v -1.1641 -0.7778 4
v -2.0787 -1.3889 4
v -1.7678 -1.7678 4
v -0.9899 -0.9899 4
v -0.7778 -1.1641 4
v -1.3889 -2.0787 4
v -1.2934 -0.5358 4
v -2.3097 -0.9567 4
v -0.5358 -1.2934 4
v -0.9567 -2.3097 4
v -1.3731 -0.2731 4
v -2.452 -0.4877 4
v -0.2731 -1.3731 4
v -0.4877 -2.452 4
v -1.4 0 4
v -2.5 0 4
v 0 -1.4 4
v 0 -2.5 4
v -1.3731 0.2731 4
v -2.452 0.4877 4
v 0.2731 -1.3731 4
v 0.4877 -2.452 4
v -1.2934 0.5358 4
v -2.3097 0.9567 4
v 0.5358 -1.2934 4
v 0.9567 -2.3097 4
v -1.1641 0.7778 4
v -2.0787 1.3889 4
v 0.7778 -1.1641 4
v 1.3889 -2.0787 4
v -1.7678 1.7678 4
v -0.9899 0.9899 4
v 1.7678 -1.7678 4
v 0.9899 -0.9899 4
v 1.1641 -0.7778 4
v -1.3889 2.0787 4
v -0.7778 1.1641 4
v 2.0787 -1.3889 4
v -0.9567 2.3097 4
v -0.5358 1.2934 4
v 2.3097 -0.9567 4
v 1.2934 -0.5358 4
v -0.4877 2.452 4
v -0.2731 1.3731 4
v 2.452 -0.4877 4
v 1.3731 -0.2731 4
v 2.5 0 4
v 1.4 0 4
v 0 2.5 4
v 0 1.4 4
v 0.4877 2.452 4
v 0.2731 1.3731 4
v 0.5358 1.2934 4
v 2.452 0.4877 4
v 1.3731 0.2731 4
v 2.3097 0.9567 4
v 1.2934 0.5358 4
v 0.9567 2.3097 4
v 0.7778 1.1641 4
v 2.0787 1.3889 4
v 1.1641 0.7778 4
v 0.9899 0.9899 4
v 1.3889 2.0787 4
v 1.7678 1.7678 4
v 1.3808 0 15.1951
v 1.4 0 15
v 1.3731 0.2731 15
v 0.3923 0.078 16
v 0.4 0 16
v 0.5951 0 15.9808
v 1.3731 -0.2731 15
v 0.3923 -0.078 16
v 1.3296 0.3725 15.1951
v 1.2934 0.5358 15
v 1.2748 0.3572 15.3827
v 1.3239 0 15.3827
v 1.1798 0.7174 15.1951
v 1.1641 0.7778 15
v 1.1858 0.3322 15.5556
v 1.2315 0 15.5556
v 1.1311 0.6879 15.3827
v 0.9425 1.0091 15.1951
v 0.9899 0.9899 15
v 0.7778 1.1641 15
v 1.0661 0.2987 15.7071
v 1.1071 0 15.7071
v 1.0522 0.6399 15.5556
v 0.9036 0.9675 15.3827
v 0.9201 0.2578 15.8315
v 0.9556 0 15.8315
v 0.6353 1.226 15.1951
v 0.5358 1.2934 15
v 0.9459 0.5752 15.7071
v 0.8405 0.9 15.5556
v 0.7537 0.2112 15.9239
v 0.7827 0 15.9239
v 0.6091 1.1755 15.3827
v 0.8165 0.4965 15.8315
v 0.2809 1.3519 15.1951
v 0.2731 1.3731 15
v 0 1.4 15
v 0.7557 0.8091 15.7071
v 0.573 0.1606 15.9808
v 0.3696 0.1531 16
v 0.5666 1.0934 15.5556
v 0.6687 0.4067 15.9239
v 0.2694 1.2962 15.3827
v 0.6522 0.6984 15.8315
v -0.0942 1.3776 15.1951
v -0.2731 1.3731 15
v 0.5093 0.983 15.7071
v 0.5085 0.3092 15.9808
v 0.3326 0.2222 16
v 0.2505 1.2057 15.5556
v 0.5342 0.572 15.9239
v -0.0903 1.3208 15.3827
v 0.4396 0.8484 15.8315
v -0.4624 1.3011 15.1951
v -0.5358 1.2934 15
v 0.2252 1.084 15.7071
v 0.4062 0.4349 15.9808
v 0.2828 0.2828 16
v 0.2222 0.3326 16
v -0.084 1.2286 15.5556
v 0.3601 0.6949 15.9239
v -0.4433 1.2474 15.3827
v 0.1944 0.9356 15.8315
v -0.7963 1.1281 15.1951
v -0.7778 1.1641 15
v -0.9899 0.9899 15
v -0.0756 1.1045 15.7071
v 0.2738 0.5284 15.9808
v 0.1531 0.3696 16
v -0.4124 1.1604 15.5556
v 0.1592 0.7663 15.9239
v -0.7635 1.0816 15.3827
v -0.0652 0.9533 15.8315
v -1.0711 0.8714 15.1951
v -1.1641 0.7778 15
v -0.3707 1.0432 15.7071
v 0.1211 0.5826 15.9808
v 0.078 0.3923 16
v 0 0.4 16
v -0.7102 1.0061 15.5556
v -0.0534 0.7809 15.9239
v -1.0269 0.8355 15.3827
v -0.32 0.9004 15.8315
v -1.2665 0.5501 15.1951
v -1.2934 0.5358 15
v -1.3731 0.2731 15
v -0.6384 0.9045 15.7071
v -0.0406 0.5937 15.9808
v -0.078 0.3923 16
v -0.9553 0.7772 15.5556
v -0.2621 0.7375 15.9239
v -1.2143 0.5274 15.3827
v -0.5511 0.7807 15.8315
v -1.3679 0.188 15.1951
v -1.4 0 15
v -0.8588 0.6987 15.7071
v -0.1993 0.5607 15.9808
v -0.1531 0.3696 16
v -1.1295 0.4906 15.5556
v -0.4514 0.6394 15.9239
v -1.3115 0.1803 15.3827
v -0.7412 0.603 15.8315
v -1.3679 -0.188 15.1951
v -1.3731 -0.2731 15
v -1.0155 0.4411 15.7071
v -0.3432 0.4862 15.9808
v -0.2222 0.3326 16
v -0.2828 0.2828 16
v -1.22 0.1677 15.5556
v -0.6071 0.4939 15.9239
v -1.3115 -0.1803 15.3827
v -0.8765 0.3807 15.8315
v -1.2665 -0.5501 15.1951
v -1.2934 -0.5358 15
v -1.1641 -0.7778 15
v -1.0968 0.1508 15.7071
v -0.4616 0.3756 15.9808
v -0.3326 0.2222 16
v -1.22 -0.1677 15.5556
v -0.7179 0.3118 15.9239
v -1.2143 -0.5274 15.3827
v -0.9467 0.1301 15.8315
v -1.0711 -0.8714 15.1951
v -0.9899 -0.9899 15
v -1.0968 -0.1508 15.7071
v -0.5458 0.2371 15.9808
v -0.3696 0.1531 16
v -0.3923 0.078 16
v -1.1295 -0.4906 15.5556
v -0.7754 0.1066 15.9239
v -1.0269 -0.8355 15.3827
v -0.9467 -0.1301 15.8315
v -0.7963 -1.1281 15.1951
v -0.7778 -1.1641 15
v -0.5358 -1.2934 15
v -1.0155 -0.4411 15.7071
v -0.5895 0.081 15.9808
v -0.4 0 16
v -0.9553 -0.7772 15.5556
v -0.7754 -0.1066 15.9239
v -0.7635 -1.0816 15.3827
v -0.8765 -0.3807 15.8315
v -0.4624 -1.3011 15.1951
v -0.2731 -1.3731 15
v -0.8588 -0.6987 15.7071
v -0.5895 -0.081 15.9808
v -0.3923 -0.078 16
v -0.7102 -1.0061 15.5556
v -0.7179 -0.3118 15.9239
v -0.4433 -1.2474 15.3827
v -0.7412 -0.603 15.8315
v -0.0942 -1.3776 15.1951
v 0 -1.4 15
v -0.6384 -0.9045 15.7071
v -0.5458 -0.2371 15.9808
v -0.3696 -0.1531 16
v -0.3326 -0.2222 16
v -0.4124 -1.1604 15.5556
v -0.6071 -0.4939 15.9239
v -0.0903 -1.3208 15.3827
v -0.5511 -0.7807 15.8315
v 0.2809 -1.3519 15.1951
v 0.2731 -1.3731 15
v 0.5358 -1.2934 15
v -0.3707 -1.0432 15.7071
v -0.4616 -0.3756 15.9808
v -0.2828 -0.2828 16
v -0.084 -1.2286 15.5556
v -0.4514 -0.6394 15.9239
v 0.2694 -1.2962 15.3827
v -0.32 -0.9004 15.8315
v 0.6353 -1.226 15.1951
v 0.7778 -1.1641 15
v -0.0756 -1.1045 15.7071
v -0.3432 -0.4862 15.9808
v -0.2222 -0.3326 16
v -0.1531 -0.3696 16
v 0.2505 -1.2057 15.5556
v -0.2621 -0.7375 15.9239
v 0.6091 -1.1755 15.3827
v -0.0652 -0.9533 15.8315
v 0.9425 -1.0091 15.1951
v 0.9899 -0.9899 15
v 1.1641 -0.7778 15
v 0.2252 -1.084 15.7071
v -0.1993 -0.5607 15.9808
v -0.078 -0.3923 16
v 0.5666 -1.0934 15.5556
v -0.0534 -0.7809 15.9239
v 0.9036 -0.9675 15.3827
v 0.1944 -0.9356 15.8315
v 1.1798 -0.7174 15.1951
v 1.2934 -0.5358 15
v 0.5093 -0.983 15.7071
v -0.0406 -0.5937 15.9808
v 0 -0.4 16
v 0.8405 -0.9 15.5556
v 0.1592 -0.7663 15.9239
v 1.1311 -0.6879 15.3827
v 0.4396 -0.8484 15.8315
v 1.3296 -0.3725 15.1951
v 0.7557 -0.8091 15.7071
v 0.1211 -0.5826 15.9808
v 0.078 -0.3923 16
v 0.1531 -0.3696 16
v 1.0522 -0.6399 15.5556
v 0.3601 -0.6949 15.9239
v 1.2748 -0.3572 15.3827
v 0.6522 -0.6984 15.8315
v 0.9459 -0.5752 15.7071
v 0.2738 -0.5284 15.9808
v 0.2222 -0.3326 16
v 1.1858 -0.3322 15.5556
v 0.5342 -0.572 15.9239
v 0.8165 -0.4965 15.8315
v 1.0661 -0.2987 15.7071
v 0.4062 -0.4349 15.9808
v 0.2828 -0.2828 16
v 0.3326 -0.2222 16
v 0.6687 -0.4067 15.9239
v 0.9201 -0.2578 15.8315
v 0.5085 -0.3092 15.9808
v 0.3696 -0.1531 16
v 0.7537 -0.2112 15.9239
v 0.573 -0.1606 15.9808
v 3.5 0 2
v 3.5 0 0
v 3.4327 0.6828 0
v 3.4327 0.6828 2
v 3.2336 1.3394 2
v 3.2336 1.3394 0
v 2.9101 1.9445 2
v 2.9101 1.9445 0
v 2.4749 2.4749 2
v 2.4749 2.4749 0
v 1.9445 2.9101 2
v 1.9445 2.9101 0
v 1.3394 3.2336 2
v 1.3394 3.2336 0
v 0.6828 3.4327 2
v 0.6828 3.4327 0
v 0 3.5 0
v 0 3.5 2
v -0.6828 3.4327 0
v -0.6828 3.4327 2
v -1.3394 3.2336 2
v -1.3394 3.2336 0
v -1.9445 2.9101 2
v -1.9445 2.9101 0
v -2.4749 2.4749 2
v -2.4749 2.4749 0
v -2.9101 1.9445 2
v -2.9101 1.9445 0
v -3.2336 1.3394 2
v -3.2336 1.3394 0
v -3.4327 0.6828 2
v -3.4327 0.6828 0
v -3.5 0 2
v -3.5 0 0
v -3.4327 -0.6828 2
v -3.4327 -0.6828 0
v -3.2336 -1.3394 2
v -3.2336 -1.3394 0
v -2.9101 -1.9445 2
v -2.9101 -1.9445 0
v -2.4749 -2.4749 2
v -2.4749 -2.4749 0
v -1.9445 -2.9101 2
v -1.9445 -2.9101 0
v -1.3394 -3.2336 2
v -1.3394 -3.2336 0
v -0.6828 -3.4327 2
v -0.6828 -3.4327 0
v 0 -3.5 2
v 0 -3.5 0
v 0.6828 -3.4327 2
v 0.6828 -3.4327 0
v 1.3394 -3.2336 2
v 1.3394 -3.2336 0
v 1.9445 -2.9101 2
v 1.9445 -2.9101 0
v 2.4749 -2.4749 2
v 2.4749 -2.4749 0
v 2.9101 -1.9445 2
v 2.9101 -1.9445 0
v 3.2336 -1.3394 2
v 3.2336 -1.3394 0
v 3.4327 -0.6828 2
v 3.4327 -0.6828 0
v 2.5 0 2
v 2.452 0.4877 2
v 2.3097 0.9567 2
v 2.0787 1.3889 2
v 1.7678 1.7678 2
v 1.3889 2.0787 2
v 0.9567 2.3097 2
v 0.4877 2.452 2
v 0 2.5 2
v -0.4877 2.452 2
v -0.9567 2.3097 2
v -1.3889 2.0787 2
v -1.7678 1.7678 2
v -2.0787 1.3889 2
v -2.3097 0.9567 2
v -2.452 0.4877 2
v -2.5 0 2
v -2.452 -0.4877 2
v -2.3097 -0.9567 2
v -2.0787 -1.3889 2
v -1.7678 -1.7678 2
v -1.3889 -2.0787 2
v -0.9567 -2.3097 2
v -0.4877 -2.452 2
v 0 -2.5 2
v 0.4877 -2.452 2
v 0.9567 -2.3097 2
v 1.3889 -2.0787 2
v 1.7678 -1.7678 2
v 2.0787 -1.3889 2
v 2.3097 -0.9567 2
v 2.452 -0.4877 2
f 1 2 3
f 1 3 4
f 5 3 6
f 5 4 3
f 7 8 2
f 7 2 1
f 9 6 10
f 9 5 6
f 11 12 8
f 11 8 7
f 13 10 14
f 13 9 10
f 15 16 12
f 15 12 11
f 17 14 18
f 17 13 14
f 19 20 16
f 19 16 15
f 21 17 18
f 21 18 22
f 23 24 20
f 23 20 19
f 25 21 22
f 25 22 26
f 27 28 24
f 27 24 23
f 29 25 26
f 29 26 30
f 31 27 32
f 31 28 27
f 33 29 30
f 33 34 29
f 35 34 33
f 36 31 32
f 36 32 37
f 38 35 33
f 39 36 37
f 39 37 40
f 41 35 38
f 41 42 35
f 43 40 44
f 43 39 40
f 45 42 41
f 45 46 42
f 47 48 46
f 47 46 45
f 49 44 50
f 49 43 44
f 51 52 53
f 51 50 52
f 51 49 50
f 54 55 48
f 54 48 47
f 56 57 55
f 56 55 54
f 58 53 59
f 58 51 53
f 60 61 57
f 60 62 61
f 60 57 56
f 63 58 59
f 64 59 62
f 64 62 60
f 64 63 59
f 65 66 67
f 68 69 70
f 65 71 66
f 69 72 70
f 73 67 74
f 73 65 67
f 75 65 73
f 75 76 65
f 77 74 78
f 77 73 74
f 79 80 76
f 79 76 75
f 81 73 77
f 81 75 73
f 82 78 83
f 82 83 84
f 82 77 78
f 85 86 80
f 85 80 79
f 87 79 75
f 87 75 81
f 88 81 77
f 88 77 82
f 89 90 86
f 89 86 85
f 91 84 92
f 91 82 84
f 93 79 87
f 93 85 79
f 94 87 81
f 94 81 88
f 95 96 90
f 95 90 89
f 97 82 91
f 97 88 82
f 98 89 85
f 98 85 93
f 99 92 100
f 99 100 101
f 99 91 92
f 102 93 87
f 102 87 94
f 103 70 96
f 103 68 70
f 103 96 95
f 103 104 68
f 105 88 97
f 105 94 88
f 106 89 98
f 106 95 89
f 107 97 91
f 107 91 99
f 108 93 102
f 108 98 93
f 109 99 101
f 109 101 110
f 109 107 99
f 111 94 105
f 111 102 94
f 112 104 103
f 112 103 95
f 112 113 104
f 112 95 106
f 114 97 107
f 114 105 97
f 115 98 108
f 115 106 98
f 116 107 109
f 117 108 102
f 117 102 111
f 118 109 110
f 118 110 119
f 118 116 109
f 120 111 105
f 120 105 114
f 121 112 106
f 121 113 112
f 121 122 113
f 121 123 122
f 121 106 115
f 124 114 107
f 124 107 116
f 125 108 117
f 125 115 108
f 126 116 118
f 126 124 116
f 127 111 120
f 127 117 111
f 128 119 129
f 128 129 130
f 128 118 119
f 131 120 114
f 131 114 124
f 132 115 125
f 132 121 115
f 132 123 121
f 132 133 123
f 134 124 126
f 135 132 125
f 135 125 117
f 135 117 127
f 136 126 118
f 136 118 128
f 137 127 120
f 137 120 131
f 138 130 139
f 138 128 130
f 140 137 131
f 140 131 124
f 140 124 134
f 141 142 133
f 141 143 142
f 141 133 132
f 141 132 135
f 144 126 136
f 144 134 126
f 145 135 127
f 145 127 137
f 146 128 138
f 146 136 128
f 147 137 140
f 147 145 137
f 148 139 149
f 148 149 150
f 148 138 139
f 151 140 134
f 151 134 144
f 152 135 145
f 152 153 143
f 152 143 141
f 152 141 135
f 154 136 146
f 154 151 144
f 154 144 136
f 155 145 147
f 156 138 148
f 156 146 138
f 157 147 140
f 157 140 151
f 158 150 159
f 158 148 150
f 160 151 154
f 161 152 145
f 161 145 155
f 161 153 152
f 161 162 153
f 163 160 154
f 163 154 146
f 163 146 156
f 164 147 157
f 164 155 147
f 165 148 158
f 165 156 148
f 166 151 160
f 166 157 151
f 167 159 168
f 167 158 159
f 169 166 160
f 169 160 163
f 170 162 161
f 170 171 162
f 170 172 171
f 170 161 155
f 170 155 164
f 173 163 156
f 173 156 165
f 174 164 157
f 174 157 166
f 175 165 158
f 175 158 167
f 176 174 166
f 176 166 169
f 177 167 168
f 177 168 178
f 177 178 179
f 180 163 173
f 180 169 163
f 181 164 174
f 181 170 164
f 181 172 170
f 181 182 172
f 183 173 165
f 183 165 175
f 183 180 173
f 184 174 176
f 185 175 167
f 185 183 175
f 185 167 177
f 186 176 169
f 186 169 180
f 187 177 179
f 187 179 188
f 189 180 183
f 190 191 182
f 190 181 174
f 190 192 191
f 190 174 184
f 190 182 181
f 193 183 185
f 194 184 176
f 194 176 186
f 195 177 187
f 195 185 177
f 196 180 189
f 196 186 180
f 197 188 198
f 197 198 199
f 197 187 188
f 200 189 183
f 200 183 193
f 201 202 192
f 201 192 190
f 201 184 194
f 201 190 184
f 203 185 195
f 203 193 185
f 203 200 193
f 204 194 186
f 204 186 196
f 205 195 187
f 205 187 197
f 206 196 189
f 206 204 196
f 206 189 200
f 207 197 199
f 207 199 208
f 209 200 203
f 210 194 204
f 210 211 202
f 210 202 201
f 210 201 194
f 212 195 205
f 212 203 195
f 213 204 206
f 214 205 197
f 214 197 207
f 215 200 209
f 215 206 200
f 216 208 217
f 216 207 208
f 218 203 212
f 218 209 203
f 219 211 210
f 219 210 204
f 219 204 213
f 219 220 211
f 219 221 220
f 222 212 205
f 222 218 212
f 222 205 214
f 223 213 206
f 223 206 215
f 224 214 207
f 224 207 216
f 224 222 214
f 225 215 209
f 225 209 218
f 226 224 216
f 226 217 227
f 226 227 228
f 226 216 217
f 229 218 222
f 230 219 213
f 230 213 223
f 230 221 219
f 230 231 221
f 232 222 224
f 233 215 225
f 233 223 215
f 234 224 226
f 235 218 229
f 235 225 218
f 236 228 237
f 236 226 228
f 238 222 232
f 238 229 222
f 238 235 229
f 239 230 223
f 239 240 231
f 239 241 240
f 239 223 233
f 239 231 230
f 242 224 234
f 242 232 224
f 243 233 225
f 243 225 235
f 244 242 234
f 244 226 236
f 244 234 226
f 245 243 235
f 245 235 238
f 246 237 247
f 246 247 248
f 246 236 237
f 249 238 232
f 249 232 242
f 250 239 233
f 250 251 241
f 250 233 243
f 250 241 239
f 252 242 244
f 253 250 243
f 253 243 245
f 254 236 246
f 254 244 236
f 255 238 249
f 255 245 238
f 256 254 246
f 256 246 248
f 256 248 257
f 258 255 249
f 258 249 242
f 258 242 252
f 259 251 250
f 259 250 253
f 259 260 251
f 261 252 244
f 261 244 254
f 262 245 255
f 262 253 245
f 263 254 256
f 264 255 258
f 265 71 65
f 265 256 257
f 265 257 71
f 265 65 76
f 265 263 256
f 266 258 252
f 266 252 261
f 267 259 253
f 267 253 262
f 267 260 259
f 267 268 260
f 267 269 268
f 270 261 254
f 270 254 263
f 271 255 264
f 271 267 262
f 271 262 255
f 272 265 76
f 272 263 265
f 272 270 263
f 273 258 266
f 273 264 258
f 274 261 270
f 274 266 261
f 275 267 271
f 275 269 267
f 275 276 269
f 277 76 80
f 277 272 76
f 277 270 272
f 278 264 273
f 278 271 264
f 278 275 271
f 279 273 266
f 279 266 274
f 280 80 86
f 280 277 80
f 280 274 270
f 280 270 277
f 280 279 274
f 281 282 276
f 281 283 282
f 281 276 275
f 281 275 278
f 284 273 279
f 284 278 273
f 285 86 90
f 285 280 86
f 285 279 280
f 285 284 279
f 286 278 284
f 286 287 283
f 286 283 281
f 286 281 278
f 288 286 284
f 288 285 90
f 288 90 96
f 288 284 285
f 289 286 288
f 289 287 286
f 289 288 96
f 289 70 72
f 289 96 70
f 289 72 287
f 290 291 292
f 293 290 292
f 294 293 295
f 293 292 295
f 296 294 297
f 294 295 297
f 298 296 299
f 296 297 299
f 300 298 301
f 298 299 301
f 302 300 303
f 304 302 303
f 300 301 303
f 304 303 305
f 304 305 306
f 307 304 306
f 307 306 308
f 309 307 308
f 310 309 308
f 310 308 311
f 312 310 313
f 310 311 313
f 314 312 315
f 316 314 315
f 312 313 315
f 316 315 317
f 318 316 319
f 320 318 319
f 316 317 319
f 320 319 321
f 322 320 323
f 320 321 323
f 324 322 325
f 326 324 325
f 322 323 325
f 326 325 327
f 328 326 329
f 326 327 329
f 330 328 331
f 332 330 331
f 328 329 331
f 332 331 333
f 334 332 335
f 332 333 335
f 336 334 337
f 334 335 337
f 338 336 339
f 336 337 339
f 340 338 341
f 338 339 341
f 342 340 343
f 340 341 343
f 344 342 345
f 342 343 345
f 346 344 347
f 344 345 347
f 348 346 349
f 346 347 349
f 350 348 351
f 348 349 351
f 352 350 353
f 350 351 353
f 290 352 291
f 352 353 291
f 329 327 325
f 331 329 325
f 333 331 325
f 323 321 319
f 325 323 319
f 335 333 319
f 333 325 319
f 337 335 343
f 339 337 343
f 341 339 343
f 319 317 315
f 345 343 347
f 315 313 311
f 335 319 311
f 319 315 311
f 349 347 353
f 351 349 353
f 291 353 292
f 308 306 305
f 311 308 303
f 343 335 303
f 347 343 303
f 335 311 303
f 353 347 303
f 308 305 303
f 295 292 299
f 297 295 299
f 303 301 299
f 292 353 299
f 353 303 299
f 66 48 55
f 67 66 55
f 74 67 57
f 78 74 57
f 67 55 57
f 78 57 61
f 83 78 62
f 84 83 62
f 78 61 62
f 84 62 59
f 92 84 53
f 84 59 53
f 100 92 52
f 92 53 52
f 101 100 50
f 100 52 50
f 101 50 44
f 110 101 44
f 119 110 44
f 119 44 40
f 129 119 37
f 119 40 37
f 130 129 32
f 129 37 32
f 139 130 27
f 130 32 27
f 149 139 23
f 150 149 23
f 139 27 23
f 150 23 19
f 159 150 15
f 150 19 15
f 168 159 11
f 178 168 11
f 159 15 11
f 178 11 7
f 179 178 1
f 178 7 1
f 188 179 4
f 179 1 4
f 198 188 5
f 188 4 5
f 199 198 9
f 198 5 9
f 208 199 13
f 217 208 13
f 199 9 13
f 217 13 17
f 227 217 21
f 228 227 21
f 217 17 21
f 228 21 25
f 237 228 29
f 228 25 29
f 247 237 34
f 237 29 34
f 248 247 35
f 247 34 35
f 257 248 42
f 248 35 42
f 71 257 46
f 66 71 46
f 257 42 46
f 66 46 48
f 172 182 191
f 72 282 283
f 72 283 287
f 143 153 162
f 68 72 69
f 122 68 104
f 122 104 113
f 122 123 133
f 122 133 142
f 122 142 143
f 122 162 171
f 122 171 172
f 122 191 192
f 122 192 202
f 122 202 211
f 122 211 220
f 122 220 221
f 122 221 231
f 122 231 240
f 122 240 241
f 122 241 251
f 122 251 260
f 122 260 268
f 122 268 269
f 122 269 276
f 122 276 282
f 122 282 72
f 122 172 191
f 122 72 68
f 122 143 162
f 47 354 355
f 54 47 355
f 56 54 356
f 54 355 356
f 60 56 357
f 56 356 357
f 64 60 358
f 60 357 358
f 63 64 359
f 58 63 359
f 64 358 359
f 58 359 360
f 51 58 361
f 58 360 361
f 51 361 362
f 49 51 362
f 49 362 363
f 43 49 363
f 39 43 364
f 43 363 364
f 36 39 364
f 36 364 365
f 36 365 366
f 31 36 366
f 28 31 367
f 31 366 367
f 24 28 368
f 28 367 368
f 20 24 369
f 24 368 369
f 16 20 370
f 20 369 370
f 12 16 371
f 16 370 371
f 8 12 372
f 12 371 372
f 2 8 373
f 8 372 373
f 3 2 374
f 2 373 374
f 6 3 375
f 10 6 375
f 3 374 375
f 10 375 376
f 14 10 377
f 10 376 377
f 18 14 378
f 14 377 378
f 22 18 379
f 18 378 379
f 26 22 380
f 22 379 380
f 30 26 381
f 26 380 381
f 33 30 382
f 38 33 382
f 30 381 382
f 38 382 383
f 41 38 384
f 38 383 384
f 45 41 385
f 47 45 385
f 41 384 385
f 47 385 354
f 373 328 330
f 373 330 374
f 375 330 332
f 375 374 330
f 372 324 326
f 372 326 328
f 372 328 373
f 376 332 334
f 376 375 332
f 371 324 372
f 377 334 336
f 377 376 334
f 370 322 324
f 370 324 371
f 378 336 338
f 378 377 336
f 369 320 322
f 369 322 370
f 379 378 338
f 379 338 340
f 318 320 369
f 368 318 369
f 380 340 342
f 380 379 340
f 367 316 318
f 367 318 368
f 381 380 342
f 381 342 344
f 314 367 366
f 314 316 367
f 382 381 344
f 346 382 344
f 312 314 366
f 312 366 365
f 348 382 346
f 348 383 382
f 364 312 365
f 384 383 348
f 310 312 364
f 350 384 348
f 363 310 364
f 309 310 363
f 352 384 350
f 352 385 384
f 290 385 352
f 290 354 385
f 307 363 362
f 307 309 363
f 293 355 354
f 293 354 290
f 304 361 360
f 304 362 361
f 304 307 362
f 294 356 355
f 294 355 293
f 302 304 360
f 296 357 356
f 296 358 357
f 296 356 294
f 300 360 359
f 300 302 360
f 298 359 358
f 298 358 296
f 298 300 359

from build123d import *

# Parameters (mm, degrees)
F0_R     = 3.5
F1_DEPTH = 2
F2_R     = 2.5
F3_DEPTH = 2
F4_R     = 1.4
F5_DEPTH = 12
F6_R     = 1


with BuildPart() as f1:
    # F0 (on Top) → F1 (new body)
    with BuildSketch(Plane.XY):
        Circle(F0_R)
    extrude(amount=F1_DEPTH)

    # F2 (on face) → F3 (join)
    with BuildSketch(Plane.XY.offset(2)):
        Circle(F2_R)
    extrude(amount=F3_DEPTH)

    # F4 (on face) → F5 (join)
    with BuildSketch(Plane.XY.offset(4)):
        Circle(F4_R)
    extrude(amount=F5_DEPTH)

    # F6
    f6_edges = [f1.edges().sort_by_distance(p)[0] for p in [
        (-1.4, 0, 16),
    ]]
    fillet(f6_edges, radius=F6_R)


solid = f1.part
